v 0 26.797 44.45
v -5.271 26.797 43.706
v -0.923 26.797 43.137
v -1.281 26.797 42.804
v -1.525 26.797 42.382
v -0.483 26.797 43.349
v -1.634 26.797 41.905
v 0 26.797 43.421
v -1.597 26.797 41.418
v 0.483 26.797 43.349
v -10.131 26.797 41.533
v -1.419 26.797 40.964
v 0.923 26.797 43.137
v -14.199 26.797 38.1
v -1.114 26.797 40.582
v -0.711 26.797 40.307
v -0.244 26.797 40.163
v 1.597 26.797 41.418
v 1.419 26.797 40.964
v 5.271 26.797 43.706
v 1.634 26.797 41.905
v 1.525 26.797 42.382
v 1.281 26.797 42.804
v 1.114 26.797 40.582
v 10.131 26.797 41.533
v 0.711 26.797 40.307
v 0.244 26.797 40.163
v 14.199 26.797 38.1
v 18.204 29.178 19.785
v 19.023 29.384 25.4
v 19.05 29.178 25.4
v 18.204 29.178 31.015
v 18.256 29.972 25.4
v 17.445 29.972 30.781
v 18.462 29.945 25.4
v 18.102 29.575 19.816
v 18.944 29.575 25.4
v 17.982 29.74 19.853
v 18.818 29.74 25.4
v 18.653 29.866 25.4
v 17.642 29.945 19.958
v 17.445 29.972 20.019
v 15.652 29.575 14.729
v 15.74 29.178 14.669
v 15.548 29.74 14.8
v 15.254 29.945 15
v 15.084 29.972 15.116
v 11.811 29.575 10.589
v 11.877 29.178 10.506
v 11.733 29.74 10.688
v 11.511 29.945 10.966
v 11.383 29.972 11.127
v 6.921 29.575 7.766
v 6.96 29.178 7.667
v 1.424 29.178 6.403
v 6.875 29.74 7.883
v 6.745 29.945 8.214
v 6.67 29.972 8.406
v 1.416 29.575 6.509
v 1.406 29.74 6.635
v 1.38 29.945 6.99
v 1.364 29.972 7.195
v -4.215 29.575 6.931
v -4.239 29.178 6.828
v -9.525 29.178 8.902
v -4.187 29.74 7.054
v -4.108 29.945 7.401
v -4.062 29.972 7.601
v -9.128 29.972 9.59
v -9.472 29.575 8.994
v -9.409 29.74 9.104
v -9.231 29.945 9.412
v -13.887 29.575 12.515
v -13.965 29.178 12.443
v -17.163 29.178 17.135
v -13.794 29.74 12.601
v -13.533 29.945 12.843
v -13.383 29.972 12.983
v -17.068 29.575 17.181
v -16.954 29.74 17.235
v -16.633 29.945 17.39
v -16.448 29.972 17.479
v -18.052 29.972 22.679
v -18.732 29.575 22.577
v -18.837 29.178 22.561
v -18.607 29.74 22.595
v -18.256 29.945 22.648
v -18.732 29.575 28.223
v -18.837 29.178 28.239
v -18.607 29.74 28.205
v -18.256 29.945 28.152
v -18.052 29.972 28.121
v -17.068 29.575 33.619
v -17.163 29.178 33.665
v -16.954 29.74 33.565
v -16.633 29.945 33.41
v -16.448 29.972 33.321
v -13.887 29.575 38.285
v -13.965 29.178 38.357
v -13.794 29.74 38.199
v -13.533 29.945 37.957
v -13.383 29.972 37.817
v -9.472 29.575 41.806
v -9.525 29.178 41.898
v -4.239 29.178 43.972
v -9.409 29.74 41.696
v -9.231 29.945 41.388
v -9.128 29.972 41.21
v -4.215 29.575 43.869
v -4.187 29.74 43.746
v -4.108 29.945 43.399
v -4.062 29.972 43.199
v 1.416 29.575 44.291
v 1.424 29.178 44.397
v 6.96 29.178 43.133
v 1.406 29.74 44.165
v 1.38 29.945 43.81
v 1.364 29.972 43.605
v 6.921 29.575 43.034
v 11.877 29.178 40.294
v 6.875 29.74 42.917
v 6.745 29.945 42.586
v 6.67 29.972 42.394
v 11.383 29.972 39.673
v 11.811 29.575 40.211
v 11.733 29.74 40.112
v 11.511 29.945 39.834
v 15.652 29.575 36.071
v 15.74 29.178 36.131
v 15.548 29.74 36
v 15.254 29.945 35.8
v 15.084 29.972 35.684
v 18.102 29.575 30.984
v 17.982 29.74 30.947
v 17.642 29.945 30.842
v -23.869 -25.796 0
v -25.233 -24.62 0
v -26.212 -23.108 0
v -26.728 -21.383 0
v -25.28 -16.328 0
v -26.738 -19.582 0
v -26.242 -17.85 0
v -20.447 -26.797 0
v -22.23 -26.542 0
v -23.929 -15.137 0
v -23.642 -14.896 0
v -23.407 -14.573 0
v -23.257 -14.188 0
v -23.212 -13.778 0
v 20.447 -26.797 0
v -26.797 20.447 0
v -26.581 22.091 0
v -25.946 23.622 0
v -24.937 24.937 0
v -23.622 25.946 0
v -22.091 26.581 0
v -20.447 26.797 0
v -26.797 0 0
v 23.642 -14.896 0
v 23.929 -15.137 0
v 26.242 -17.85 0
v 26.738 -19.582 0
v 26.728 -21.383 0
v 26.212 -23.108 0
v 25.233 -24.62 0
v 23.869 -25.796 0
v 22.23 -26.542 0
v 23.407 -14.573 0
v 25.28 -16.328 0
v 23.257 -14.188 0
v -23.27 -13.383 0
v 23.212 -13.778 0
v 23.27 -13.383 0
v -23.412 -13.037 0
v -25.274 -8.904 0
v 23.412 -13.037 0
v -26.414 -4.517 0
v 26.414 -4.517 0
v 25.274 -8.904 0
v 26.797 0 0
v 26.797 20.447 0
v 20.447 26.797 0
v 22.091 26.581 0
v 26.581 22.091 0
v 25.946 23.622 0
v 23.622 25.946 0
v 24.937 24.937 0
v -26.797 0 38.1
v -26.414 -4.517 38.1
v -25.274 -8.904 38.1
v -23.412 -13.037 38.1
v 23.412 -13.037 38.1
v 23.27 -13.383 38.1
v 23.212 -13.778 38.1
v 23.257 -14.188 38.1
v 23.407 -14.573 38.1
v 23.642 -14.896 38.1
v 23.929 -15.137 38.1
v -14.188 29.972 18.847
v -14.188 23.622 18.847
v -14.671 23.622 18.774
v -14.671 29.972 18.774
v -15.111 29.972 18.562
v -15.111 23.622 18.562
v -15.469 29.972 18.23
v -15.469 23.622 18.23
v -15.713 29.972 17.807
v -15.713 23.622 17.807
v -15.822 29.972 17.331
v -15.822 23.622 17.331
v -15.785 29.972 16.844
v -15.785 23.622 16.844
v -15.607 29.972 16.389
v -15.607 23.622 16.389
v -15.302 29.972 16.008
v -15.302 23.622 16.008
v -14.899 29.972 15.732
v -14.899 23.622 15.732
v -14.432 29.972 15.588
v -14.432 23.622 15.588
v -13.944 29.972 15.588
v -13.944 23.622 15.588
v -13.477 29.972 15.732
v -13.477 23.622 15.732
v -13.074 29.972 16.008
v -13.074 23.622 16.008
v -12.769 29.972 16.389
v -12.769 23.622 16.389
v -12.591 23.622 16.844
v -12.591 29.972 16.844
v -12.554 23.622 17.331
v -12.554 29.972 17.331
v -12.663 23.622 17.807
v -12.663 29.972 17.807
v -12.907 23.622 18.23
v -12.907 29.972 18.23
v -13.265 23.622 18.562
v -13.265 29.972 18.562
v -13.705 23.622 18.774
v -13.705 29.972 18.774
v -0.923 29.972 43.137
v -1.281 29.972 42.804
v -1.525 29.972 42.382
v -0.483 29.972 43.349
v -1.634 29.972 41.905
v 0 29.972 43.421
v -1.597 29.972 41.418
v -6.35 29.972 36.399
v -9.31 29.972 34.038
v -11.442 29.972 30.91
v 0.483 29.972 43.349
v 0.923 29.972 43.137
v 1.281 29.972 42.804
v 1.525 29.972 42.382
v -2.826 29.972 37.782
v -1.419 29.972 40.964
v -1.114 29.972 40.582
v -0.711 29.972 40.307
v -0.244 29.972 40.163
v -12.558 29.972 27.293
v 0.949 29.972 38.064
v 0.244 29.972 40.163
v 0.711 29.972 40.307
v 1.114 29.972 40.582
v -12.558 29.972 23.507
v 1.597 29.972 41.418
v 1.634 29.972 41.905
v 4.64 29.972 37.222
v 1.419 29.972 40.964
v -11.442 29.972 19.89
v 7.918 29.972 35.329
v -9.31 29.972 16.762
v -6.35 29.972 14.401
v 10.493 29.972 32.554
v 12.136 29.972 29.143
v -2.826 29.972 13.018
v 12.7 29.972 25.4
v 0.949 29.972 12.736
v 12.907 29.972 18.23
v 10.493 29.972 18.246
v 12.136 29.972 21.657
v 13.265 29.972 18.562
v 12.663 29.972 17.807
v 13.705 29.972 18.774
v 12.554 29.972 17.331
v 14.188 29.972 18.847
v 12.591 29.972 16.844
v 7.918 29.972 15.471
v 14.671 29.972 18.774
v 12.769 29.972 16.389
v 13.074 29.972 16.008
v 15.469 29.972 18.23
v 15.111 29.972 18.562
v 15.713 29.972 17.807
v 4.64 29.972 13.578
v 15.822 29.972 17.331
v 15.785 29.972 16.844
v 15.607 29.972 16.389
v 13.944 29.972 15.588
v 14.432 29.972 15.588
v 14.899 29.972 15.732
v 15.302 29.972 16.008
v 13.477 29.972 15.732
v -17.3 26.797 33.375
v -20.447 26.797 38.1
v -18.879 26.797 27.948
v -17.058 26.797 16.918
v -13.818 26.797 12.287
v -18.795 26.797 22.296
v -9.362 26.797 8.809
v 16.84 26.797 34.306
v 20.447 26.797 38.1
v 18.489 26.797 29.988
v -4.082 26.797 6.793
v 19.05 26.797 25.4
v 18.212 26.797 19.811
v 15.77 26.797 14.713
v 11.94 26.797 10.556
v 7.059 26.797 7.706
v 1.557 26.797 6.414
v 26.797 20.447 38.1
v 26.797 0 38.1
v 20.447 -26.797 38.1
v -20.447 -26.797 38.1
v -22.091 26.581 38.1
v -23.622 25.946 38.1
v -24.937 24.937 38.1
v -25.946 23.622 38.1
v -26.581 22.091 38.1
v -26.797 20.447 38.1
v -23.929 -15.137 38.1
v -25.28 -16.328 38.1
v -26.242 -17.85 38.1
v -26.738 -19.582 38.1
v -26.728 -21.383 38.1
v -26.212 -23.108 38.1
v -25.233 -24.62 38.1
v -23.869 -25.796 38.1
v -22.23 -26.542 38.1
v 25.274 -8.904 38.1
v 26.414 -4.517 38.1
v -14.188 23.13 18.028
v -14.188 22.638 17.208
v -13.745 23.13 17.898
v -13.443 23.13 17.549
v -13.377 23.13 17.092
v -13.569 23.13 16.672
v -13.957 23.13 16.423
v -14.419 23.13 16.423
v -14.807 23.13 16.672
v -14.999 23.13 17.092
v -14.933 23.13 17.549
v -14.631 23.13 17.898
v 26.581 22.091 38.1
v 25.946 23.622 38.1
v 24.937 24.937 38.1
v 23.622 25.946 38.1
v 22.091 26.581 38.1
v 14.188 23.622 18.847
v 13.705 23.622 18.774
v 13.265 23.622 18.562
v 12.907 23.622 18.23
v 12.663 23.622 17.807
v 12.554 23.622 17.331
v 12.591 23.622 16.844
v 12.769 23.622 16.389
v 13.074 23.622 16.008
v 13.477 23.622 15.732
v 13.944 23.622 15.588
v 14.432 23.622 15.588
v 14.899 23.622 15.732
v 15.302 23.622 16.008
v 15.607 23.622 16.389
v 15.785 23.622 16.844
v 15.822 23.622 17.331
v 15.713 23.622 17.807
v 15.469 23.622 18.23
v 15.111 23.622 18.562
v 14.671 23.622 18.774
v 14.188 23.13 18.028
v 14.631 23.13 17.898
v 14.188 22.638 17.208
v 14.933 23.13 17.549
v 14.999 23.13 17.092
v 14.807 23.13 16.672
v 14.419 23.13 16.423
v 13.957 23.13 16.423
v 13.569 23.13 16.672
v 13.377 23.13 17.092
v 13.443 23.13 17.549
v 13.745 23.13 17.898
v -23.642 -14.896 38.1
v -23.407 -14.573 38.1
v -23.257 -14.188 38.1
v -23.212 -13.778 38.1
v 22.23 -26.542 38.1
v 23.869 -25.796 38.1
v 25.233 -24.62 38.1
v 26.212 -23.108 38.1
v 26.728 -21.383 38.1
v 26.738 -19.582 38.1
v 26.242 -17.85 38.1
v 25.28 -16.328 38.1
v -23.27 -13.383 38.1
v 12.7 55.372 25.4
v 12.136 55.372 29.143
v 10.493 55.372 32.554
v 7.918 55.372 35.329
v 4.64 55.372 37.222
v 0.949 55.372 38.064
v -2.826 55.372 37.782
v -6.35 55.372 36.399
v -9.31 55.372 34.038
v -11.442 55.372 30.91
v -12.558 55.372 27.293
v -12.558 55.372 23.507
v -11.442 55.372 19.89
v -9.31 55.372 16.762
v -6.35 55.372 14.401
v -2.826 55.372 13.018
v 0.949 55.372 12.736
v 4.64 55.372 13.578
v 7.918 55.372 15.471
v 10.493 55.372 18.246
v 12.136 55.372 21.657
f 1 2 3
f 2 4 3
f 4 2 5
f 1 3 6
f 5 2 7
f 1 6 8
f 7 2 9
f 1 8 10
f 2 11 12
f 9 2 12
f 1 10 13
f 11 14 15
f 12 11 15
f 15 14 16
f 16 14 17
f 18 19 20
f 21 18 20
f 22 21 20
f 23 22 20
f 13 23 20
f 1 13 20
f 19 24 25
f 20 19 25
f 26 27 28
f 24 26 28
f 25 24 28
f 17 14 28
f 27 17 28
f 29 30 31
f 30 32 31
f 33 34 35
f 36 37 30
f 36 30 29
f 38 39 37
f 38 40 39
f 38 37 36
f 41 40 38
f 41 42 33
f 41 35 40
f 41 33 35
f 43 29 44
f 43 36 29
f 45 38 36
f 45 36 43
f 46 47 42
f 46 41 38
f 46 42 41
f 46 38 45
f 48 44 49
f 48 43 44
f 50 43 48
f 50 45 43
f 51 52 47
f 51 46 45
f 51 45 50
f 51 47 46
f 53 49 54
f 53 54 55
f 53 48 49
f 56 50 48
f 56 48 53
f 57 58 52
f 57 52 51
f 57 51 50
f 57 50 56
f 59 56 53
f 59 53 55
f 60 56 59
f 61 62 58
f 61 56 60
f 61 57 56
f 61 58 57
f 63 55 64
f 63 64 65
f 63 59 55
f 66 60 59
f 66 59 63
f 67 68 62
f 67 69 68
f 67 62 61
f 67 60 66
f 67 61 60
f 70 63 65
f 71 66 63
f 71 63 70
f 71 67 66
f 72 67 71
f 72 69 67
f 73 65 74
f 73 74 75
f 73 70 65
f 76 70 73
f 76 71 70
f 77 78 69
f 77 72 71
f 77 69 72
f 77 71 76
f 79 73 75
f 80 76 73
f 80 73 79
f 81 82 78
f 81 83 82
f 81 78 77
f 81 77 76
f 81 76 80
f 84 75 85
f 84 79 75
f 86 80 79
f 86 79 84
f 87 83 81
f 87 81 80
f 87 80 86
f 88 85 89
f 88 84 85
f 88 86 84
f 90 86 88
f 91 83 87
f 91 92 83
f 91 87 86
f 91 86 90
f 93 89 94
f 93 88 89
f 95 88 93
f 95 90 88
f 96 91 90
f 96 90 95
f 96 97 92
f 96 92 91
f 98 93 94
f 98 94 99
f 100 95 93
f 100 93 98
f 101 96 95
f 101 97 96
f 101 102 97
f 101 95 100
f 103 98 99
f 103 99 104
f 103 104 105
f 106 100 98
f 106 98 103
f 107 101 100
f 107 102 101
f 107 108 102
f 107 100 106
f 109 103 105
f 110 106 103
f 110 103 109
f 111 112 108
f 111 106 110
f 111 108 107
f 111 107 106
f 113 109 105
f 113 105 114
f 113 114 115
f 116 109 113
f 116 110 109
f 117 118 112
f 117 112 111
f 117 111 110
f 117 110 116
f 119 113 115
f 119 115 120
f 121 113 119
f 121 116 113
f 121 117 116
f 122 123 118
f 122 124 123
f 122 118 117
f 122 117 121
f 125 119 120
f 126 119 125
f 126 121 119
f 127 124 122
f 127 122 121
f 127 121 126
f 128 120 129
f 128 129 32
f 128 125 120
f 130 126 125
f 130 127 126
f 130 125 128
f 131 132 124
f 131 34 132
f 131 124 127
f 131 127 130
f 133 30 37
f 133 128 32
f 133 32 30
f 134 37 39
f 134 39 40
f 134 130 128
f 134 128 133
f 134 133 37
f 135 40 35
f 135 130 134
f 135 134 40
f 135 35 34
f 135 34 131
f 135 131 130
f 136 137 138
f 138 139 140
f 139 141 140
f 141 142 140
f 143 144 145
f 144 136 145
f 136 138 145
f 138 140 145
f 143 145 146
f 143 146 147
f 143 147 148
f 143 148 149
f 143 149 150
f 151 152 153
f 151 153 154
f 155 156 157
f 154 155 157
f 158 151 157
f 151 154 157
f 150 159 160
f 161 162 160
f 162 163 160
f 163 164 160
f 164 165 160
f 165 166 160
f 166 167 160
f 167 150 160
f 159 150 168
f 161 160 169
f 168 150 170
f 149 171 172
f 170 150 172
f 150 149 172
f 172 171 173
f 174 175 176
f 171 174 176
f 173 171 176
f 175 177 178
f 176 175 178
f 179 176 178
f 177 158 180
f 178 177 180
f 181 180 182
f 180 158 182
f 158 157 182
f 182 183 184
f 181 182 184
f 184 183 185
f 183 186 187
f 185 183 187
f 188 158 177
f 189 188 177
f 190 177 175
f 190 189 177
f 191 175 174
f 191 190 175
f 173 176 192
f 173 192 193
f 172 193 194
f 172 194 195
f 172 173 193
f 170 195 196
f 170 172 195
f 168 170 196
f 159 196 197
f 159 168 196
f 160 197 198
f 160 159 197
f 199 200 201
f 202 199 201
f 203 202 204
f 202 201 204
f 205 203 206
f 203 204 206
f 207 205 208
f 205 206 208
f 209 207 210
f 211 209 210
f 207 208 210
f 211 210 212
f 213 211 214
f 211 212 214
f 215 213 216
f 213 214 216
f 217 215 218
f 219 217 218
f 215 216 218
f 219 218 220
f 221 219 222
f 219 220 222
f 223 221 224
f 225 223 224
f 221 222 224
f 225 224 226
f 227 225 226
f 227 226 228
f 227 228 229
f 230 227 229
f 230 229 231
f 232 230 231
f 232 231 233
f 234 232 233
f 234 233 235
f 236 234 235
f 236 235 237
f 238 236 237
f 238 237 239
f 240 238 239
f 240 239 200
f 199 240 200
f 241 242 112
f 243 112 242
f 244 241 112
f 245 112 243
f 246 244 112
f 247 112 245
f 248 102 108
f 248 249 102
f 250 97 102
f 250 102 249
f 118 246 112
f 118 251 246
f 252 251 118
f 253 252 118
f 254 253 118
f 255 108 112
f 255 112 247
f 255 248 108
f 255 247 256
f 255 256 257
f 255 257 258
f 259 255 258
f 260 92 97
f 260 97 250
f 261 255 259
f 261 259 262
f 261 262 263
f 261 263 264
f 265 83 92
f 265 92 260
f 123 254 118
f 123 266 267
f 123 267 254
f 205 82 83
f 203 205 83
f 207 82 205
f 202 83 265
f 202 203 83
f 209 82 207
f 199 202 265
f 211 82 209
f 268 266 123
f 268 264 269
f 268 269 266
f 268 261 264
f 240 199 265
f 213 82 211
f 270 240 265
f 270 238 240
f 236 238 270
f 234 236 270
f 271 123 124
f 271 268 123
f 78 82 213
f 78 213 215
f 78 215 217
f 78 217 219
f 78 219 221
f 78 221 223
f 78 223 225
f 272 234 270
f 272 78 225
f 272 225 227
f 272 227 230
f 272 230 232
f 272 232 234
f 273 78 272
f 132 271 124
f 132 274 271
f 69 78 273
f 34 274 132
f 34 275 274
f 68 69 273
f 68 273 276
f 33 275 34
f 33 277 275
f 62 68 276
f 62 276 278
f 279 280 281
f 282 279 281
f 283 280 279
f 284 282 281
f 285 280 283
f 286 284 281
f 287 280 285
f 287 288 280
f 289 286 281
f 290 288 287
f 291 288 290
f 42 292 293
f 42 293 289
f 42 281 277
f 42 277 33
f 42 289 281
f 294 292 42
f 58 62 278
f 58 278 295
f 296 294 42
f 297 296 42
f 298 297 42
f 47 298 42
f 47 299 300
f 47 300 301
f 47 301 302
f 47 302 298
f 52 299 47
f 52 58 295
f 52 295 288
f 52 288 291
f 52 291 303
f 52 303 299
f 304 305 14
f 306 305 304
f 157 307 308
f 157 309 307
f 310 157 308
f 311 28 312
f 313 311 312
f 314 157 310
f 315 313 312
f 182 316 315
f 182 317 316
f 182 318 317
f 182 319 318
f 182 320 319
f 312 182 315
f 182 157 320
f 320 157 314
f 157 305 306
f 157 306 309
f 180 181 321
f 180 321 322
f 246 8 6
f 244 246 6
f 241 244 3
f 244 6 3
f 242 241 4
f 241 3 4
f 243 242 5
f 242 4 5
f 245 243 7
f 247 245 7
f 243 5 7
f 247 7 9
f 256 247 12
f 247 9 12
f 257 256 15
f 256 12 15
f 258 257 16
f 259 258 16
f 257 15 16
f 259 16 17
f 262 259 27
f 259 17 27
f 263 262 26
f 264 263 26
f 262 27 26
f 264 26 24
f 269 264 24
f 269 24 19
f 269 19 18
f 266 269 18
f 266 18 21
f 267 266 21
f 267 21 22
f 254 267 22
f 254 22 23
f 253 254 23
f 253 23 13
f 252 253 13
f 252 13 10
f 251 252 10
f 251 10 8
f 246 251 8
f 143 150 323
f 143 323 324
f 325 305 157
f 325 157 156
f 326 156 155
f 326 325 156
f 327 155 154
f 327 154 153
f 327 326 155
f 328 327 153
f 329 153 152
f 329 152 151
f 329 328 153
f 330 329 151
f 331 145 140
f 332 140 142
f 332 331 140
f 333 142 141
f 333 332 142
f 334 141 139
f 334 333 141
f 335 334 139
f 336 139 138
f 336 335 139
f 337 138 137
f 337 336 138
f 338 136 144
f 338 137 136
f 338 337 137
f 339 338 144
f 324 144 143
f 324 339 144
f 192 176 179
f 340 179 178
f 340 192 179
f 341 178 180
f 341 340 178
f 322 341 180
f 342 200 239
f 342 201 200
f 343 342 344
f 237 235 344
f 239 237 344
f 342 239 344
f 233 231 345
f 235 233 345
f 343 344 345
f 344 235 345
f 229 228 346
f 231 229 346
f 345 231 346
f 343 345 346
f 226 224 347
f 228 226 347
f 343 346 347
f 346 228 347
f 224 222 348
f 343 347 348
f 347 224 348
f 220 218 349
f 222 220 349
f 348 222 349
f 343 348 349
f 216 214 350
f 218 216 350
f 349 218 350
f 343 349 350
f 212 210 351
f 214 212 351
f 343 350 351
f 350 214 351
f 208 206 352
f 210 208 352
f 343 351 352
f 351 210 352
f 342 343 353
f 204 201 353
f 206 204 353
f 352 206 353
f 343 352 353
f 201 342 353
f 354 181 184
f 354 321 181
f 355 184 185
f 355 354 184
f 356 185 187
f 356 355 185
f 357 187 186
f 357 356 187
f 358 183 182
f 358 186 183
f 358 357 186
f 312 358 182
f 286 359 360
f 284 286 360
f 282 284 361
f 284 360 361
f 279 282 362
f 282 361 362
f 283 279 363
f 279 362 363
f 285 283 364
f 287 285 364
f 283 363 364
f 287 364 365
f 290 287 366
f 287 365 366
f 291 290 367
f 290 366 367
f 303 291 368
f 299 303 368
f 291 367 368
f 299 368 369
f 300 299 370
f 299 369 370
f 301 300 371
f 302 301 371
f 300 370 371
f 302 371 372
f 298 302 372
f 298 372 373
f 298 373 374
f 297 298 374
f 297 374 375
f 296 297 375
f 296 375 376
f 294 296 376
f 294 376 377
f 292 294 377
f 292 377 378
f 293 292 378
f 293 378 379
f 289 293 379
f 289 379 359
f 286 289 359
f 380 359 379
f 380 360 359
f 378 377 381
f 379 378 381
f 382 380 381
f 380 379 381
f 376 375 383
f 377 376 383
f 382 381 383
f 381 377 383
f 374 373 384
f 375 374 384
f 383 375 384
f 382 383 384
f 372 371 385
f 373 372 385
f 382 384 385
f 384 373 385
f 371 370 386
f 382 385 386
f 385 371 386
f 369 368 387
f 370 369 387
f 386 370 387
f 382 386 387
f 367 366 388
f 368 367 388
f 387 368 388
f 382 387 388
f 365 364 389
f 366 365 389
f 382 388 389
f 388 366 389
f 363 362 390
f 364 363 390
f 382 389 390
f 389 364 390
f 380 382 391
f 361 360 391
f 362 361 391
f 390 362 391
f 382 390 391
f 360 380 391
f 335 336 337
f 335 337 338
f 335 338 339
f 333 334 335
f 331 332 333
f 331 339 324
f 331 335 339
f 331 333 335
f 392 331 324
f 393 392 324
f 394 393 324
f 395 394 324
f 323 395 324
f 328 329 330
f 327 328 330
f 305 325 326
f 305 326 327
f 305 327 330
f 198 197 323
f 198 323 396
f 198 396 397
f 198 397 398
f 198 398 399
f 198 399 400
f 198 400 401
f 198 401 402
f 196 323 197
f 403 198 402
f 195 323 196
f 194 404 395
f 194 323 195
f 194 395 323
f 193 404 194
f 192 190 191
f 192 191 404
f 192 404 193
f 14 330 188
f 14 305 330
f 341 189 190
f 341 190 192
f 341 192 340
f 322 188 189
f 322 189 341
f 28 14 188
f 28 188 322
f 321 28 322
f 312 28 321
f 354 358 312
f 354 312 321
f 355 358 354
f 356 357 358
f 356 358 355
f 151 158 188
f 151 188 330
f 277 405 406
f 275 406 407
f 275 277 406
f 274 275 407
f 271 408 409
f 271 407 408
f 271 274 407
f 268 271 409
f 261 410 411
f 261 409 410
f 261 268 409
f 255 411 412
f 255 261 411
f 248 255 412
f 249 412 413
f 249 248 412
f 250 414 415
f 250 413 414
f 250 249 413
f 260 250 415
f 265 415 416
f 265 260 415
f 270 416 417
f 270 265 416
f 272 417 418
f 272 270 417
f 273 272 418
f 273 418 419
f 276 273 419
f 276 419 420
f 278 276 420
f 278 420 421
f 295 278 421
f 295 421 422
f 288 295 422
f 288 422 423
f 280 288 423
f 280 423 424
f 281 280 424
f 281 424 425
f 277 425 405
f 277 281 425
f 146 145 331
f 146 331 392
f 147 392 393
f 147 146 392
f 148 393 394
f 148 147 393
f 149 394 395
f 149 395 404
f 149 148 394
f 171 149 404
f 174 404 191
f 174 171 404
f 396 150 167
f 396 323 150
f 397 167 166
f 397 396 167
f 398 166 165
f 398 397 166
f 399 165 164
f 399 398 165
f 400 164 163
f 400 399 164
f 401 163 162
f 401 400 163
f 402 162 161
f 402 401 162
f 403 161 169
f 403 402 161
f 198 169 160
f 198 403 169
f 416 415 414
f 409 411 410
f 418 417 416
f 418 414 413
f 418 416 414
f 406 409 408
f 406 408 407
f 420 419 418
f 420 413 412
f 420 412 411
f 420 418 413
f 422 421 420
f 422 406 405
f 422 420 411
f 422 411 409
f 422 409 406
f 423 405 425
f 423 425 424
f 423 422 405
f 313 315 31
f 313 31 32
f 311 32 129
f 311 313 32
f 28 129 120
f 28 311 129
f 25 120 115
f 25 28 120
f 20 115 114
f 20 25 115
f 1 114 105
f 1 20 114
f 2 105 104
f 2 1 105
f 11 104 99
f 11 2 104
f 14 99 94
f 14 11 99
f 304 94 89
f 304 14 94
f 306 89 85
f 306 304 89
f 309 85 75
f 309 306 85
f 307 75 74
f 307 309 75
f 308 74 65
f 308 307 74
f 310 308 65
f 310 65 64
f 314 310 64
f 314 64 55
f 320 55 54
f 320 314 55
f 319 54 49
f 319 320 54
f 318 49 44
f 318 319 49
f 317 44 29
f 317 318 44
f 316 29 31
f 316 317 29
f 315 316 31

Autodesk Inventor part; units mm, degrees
ref_plane "YZ Plane" through (0, 0, 0) normal (1, 0, 0) x (0, 1, 0)
ref_plane "XZ Plane" through (0, 0, 0) normal (0, 1, 0) x (-1, 0, 0)
ref_plane "XY Plane" through (0, 0, 0) normal (0, 0, 1) x (1, 0, 0)
sketch "Sketch1" plane through (0, 0, 0) normal (0, 0, 1) x (1, 0, 0)
  line L0 (-26.797, 26.797) -> (26.797, 26.797)
  line L1 (26.797, 26.797) -> (26.797, -26.797)
  line L2 (26.797, -26.797) -> (-26.797, -26.797)
  line L3 (-26.797, -26.797) -> (-26.797, 26.797)
  point P0 (0, 0)
  point P1 (-26.797, 0)
  point P2 (0, 26.797)
  dimension "d0" = 53.594
  dimension "d1" = 53.594
extrude "Extrusion1" add sketch "Sketch1" along normal blind 38.1
fillet "Fillet1" radius 6.35 2 edges at (-26.797, 26.797, 19.05) (26.797, 26.797, 19.05)
sketch "Sketch3" plane through (0, 0, 38.1) normal (0, 0, 1) x (1, 0, 0)
  arc A0 (26.797, 20.447) -> (20.447, 26.797) centre (20.447, 20.447) ccw projected
  line L0 (-20.447, 26.797) -> (20.447, 26.797) projected
  arc A1 (-20.447, 26.797) -> (-26.797, 20.447) centre (-20.447, 20.447) ccw projected
  line L1 (-26.797, -26.797) -> (-26.797, 20.447) projected
  line L2 (26.797, -26.797) -> (-26.797, -26.797) projected
  line L3 (26.797, 20.447) -> (26.797, -26.797) projected
  arc A2 (-22.5612, -14.4593) -> (-20.447, -26.797) centre (-20.447, -20.447) ccw
  arc A3 (20.447, -26.797) -> (22.5612, -14.4593) centre (20.447, -20.447) ccw
  line L4 (-26.797, -26.797) -> (26.797, -26.797)
  line L5 (-26.797, 0) -> (-26.797, -26.797)
  line L6 (26.797, 0) -> (26.797, -26.797)
  arc A4 (22.5612, -14.4593) -> (-22.5612, -14.4593) centre (0, 0) ccw
  line L7 (-26.797, 0) -> (-26.797, 20.447)
  line L8 (-20.447, 26.797) -> (20.447, 26.797)
  line L9 (26.797, 20.447) -> (26.797, 0)
  arc A5 (-20.447, 26.797) -> (-26.797, 20.447) centre (-20.447, 20.447) ccw
  arc A6 (26.797, 20.447) -> (20.447, 26.797) centre (20.447, 20.447) ccw
  dimension "d9" = 12.7
  dimension "d10" = 12.7
  dimension "d12" = 26.797
extrude "Extrusion2" cut sketch "Sketch3" against normal through all contours L3 A3 A4 | L3 L2 A3 | A4 A2 L1 | A2 L2 L1
fillet "Fillet2" radius 1.5875 2 edges at (22.5612, -14.4593, 19.05) (-22.5612, -14.4593, 19.05)
sketch "Sketch4" plane through (-20.447, 26.797, 0) normal (0, 1, 0) x (1, 0, 0)
  line L0 (0, 0) -> (40.894, 0) projected
  line L1 (-6.35, -38.1) -> (0, -38.1) projected
  line L2 (0, -38.1) -> (0, 0) projected
  line L3 (0, 0) -> (-6.35, 0) projected
  line L4 (-6.35, 0) -> (-6.35, -38.1) projected
  line L5 (43.8591, 0) -> (43.8591, -38.1) projected
  line L6 (40.894, -38.1) -> (47.244, -38.1) projected
  line L7 (47.244, -38.1) -> (47.244, 0) projected
  line L8 (47.244, 0) -> (40.894, 0) projected
  line L9 (40.894, 0) -> (40.894, -38.1) projected
  line L10 (-2.9651, -38.1) -> (-2.9651, 0) projected
  circle A0 centre (20.447, -25.4) radius 19.05
  point P0 (20.447, 0)
  point P1 (20.447, -6.35)
  point P2 (20.447, 0)
  dimension "d16" = 38.1
  dimension "d17" = 6.35
extrude "Extrusion3" add sketch "Sketch4" along normal blind 3.175 contours A0
fillet "Fillet3" radius 0.7937 1 edges at (-19.05, 29.972, 25.4)
sketch "Sketch5" plane through (0, 29.972, 25.4) normal (0, 1, 0) x (1, 0, 0)
  circle A0 centre (0, 0) radius 18.2562 projected
  circle A1 centre (0, 0) radius 12.7
  circle A2 centre (0, 0) radius 19.05 projected
  point P0 (0, 25.4)
  dimension "d24" = 6.35
extrude "Extrusion4" add sketch "Sketch5" along normal blind 25.4 contours A1
sketch "Sketch6" plane through (0, 29.972, 25.4) normal (0, 1, 0) x (1, 0, 0)
  circle A0 centre (-14.1881, 8.1915) radius 1.6383 projected
  circle A1 centre (0, -16.383) radius 1.6383 projected
  circle A2 centre (14.1881, 8.1915) radius 1.6383 projected
  point P0 (0, 25.4)
hole "Hole1" at (0, 29.972, 41.783) at (14.1881, 29.972, 17.2085) at (-14.1881, 29.972, 17.2085) direction (0, -1, 0) diameter 3.2766 depth 6.35 tip angle 118 clearance for "Flat Head Machine Screw (82)" size "#4" standard "Ansi Unified Screw Threads"
properties part number "Pneumatics_VIAIR_0090_02"
